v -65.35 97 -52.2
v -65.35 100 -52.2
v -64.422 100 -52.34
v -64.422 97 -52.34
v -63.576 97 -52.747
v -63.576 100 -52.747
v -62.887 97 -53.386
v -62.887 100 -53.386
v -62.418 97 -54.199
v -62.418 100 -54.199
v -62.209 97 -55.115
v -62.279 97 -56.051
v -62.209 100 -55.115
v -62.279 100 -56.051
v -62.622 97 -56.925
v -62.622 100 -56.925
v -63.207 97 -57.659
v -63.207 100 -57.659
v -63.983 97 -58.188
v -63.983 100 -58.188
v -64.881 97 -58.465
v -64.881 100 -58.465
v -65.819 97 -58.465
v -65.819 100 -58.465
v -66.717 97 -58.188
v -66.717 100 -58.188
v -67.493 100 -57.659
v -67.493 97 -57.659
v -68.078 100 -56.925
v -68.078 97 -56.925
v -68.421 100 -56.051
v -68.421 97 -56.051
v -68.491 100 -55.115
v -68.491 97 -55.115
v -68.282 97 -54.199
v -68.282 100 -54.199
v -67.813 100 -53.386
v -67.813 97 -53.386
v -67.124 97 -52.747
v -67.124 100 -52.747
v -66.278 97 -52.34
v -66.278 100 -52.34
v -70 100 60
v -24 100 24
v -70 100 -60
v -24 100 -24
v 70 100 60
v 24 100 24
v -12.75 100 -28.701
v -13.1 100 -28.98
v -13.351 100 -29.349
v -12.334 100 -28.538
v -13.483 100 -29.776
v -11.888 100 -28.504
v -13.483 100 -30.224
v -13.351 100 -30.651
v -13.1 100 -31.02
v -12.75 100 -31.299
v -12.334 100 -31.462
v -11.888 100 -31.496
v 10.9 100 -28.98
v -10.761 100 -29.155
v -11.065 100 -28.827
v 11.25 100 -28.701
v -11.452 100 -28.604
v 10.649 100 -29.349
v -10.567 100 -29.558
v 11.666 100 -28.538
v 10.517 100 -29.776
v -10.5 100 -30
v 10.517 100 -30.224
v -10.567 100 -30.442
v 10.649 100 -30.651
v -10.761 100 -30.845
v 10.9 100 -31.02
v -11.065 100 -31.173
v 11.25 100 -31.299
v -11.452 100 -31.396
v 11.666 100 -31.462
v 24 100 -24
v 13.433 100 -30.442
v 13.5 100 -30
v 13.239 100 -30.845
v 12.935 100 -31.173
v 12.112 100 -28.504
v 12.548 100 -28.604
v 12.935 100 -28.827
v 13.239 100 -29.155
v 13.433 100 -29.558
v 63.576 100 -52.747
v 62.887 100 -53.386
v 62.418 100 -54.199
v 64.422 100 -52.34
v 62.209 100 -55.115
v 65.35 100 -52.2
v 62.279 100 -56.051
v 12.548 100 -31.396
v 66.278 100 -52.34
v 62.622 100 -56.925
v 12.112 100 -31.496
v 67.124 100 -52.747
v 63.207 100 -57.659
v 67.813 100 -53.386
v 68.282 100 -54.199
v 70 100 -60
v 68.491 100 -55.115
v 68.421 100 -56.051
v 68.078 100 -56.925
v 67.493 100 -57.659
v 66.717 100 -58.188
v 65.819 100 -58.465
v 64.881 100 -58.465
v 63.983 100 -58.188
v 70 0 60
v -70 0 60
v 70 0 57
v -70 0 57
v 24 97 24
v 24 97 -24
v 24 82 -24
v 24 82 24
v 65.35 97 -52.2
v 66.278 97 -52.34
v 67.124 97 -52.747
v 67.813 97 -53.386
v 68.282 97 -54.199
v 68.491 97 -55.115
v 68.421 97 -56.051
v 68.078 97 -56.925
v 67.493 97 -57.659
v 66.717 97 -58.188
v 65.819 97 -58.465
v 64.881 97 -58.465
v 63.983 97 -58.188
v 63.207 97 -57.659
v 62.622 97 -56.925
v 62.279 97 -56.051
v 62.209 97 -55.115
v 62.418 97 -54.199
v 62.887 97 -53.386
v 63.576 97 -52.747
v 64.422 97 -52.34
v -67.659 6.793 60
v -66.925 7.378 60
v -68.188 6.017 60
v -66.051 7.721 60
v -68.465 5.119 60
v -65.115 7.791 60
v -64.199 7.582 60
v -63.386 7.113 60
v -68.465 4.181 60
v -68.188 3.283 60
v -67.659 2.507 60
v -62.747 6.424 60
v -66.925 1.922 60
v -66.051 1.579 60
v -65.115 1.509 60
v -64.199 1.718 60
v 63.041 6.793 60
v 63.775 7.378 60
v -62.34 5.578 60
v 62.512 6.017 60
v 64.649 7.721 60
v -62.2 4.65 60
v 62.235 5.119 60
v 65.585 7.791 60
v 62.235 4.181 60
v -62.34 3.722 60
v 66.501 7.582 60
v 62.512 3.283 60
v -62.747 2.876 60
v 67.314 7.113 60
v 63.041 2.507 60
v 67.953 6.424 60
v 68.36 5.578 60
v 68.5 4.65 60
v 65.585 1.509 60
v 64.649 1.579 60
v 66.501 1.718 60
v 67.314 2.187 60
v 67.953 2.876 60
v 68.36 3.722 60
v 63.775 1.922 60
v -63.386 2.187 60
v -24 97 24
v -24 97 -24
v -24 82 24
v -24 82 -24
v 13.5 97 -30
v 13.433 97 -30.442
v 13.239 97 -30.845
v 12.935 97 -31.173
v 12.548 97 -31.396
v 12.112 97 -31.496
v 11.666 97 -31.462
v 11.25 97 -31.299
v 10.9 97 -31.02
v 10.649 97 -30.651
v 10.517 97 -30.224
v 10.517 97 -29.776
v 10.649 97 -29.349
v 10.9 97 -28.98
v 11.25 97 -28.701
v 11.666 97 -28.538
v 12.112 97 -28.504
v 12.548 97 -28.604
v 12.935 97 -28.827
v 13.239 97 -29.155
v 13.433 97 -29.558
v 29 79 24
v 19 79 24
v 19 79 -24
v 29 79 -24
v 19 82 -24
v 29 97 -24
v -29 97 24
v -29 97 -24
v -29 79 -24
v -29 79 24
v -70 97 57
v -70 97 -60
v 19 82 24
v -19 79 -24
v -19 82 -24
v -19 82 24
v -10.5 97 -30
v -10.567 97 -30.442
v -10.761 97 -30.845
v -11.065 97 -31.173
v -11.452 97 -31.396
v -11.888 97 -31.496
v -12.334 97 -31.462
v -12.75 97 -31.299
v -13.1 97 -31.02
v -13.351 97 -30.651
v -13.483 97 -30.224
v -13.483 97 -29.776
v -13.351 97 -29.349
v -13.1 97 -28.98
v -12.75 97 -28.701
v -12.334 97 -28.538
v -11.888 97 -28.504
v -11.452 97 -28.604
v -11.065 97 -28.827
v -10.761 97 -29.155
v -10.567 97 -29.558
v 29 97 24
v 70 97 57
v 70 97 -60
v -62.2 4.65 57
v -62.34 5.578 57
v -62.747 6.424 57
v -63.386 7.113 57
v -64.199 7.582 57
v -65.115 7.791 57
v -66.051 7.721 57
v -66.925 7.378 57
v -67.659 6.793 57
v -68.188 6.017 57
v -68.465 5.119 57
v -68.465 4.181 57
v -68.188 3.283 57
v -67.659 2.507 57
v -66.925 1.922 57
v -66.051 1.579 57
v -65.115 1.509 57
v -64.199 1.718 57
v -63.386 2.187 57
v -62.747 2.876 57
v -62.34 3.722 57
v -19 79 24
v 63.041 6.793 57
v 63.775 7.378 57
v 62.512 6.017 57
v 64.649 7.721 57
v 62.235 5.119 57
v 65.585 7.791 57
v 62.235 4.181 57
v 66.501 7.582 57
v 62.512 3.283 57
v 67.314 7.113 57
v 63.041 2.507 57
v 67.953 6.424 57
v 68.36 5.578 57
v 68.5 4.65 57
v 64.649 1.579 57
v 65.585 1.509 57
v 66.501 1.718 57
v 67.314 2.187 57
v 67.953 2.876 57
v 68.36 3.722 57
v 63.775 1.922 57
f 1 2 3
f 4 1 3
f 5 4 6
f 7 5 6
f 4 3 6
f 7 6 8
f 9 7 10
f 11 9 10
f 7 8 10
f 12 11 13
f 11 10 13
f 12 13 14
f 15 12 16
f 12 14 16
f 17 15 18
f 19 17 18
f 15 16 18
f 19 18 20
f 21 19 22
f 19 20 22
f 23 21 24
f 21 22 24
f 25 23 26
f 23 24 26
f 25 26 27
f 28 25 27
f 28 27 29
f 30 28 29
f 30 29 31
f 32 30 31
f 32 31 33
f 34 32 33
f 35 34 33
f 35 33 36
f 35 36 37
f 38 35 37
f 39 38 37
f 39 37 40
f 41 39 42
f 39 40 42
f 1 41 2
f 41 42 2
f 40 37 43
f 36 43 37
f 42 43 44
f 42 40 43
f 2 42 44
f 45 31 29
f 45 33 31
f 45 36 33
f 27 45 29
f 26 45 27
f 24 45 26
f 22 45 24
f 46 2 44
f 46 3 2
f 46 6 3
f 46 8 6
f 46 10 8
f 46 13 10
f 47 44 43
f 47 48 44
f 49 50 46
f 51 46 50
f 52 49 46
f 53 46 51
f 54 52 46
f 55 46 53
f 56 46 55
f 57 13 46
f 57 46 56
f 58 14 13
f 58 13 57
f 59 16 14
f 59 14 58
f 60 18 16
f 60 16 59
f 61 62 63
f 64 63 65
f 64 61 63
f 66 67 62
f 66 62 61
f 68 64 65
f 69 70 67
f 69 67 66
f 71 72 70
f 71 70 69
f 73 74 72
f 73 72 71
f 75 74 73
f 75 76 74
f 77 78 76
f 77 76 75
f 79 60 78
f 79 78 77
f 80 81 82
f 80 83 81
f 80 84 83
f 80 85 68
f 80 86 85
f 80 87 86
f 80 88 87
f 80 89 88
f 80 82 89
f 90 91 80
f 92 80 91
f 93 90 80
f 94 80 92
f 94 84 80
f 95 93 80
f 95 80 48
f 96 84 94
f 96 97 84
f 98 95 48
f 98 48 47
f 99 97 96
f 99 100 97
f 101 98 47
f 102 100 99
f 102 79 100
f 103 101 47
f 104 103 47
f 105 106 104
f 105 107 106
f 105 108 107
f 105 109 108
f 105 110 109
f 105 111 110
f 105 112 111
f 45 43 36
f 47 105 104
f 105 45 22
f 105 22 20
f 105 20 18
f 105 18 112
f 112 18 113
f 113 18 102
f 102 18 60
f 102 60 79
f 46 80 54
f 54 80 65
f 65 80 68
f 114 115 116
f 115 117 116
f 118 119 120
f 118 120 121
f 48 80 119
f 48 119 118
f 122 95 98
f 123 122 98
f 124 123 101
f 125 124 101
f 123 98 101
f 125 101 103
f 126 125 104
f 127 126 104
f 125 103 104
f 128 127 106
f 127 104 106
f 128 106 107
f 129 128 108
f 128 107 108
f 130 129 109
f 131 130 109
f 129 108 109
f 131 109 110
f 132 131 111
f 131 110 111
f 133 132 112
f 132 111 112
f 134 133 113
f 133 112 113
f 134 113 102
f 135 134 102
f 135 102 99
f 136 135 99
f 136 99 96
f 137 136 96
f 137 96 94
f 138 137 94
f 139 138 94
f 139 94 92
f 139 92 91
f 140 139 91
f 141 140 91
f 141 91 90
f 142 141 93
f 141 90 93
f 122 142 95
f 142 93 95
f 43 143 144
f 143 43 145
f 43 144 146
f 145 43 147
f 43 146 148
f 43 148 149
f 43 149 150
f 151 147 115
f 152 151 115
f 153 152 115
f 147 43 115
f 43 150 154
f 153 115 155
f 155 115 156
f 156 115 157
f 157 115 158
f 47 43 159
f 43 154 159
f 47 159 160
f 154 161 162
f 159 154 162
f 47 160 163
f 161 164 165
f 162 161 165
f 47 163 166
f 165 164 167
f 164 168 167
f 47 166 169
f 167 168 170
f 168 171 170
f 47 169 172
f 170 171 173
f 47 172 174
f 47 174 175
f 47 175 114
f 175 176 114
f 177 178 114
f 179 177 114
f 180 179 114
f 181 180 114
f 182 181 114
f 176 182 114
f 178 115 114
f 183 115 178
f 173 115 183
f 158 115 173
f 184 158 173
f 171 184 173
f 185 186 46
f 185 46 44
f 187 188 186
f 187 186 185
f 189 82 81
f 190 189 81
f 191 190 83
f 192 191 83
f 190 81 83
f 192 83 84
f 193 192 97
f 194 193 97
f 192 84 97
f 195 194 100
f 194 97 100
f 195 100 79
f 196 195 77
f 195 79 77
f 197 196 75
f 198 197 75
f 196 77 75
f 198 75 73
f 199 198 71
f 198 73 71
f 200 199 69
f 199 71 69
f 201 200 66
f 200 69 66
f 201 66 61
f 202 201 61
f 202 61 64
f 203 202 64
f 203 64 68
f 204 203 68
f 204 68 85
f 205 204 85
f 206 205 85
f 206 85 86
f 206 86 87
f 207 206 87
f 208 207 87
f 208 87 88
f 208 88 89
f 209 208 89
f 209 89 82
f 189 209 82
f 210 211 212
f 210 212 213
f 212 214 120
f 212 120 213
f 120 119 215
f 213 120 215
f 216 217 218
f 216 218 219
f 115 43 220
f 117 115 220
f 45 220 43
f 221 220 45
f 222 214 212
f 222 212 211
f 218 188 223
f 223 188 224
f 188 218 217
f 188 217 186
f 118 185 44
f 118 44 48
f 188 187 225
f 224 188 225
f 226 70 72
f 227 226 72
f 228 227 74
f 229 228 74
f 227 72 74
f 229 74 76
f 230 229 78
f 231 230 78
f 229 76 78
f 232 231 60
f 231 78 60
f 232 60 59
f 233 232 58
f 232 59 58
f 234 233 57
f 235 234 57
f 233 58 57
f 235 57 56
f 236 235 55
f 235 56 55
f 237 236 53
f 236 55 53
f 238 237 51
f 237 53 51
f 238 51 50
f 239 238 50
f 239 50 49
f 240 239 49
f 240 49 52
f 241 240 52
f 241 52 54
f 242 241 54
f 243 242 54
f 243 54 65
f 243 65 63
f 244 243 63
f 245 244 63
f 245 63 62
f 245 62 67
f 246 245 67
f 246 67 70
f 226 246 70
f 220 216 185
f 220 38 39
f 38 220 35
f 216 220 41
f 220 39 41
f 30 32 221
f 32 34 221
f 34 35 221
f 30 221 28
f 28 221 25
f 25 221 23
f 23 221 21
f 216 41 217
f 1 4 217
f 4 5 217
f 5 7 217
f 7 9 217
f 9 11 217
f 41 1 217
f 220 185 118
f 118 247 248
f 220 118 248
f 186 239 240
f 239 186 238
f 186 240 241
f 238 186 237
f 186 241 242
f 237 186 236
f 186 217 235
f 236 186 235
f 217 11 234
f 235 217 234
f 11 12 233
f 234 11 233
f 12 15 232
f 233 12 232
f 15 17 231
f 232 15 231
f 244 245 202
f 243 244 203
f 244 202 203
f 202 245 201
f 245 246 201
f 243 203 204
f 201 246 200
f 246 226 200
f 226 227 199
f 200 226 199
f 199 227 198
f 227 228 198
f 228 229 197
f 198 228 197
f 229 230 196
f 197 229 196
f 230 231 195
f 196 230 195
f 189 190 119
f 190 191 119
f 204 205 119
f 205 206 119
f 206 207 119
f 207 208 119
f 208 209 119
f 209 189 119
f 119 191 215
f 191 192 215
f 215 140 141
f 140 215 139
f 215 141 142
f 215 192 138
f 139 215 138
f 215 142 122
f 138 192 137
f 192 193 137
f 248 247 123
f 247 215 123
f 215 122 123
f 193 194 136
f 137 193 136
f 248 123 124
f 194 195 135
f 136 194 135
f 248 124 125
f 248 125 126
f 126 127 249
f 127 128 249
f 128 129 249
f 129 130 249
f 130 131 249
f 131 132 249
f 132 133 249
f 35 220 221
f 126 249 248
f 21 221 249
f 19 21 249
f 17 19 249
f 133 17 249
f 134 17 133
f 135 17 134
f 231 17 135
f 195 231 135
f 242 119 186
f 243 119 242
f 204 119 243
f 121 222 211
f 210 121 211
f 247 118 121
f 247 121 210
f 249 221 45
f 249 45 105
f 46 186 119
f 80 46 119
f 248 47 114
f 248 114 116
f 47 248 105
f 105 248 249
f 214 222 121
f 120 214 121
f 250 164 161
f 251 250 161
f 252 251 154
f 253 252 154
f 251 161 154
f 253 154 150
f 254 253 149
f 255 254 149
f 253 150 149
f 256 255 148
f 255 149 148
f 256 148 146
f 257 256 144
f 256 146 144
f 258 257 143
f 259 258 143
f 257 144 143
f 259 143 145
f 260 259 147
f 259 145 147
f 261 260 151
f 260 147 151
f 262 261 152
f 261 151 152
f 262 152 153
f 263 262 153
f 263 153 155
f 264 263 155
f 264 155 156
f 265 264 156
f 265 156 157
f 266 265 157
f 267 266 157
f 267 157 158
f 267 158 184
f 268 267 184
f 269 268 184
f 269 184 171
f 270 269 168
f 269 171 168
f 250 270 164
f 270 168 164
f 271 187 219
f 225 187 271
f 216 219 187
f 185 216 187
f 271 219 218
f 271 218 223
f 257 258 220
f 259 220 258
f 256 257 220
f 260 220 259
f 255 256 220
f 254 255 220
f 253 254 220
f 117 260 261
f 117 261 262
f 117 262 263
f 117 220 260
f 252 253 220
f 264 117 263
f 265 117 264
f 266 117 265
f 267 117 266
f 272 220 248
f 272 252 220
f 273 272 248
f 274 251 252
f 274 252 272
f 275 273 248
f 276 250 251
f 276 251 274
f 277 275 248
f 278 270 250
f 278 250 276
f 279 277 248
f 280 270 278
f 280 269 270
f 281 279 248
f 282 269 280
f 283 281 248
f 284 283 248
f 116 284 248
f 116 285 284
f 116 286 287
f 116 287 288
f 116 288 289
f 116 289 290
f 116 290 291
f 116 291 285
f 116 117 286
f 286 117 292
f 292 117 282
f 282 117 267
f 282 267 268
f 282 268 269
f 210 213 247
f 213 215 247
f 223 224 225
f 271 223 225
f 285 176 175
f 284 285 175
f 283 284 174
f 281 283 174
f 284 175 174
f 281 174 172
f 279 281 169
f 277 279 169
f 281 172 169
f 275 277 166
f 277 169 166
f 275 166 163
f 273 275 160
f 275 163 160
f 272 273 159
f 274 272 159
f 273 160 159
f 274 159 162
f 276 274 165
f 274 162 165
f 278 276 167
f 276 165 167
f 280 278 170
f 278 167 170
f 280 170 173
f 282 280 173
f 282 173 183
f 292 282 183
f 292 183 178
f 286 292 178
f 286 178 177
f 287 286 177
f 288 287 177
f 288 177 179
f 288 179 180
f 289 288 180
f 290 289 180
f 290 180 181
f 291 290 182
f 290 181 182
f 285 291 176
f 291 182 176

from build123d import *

# Parameters (mm, degrees)
SKETCH1_W                 = 140
SKETCH1_H                 = 120
BOSS_EXTRUDE1_DEPTH       = 100
SHELL1_T                  = -3
SKETCH6_R                 = 3.15
CUT_EXTRUDE4_DEPTH        = 3
SKETCH7_R                 = 3.15
CUT_EXTRUDE5_DEPTH        = 3
SKETCH8_W                 = 48
SKETCH8_H                 = 48
CUT_EXTRUDE6_DEPTH        = 3
SKETCH9_W                 = 5
SKETCH9_H                 = 48
BOSS_EXTRUDE2_DEPTH       = 15
SKETCH10_W                = 10
SKETCH10_H                = 48
BOSS_EXTRUDE3_DEPTH       = 3
F_3_0MM_DOWEL_HOLE1_D     = 3
F_3_0MM_DOWEL_HOLE1_DEPTH = 5
F_3_0MM_DOWEL_HOLE1_TIP   = 0.901290929


with BuildPart() as part:
    # Sketch1 → Boss-Extrude1 (new body)
    with BuildSketch(Plane(origin=(0, 0, 0), x_dir=(1, 0, 0), z_dir=(0, 1, 0))):
        Rectangle(SKETCH1_W, SKETCH1_H)
    extrude(amount=BOSS_EXTRUDE1_DEPTH)

    # Shell1
    shell1_openings = [part.faces().sort_by_distance(p)[0] for p in [
        (0, 0, 0),
        (-70, 50, 0),
        (0, 50, -60),
        (70, 50, 0),
    ]]
    offset(amount=SHELL1_T, openings=shell1_openings, kind=Kind.INTERSECTION)

    # Sketch6 → Cut-Extrude4 (cut)
    with BuildSketch(Plane.XY.offset(60)):
        with Locations((-65.35, 4.65)):
            Circle(SKETCH6_R)
        with Locations((65.35, 4.65)):
            Circle(SKETCH6_R)
    extrude(amount=-CUT_EXTRUDE4_DEPTH, mode=Mode.SUBTRACT)

    # Sketch7 → Cut-Extrude5 (cut)
    with BuildSketch(Plane(origin=(0, 100, 0), x_dir=(1, 0, 0), z_dir=(0, 1, 0))):
        with Locations(Location((-65.35, 55.35, 0), (0, 0, 270))):
            Circle(SKETCH7_R)
        with Locations(Location((65.35, 55.35, 0), (0, 0, 270))):
            Circle(SKETCH7_R)
    extrude(amount=-CUT_EXTRUDE5_DEPTH, mode=Mode.SUBTRACT)

    # Sketch8 → Cut-Extrude6 (cut)
    with BuildSketch(Plane.XZ.offset(-97)):
        Rectangle(SKETCH8_W, SKETCH8_H)
    extrude(amount=-CUT_EXTRUDE6_DEPTH, mode=Mode.SUBTRACT)

    # Sketch9 → Boss-Extrude2 (add)
    with BuildSketch(Plane.XZ.offset(-97)):
        with Locations((26.5, 0)):
            Rectangle(SKETCH9_W, SKETCH9_H)
        with Locations((-26.5, 0)):
            Rectangle(SKETCH9_W, SKETCH9_H)
    extrude(amount=BOSS_EXTRUDE2_DEPTH)

    # Sketch10 → Boss-Extrude3 (add)
    with BuildSketch(Plane.XZ.offset(-82)):
        with Locations((24, 0)):
            Rectangle(SKETCH10_W, SKETCH10_H)
        with Locations((-24, 0)):
            Rectangle(SKETCH10_W, SKETCH10_H)
    extrude(amount=BOSS_EXTRUDE3_DEPTH)

    # Ø3.0mm Dowel Hole1
    with Locations(Plane(origin=(0, 97, 0), x_dir=(-1, 0, 0), z_dir=(0, -1, 0))):
        with Locations((12, 30), (-12, 30)):
            Hole(F_3_0MM_DOWEL_HOLE1_D / 2, depth=F_3_0MM_DOWEL_HOLE1_DEPTH)
            with Locations((0, 0, -(F_3_0MM_DOWEL_HOLE1_DEPTH + F_3_0MM_DOWEL_HOLE1_TIP / 2))):  # 118° drill point
                Cone(0, F_3_0MM_DOWEL_HOLE1_D / 2, F_3_0MM_DOWEL_HOLE1_TIP, mode=Mode.SUBTRACT)


solid = part.part
